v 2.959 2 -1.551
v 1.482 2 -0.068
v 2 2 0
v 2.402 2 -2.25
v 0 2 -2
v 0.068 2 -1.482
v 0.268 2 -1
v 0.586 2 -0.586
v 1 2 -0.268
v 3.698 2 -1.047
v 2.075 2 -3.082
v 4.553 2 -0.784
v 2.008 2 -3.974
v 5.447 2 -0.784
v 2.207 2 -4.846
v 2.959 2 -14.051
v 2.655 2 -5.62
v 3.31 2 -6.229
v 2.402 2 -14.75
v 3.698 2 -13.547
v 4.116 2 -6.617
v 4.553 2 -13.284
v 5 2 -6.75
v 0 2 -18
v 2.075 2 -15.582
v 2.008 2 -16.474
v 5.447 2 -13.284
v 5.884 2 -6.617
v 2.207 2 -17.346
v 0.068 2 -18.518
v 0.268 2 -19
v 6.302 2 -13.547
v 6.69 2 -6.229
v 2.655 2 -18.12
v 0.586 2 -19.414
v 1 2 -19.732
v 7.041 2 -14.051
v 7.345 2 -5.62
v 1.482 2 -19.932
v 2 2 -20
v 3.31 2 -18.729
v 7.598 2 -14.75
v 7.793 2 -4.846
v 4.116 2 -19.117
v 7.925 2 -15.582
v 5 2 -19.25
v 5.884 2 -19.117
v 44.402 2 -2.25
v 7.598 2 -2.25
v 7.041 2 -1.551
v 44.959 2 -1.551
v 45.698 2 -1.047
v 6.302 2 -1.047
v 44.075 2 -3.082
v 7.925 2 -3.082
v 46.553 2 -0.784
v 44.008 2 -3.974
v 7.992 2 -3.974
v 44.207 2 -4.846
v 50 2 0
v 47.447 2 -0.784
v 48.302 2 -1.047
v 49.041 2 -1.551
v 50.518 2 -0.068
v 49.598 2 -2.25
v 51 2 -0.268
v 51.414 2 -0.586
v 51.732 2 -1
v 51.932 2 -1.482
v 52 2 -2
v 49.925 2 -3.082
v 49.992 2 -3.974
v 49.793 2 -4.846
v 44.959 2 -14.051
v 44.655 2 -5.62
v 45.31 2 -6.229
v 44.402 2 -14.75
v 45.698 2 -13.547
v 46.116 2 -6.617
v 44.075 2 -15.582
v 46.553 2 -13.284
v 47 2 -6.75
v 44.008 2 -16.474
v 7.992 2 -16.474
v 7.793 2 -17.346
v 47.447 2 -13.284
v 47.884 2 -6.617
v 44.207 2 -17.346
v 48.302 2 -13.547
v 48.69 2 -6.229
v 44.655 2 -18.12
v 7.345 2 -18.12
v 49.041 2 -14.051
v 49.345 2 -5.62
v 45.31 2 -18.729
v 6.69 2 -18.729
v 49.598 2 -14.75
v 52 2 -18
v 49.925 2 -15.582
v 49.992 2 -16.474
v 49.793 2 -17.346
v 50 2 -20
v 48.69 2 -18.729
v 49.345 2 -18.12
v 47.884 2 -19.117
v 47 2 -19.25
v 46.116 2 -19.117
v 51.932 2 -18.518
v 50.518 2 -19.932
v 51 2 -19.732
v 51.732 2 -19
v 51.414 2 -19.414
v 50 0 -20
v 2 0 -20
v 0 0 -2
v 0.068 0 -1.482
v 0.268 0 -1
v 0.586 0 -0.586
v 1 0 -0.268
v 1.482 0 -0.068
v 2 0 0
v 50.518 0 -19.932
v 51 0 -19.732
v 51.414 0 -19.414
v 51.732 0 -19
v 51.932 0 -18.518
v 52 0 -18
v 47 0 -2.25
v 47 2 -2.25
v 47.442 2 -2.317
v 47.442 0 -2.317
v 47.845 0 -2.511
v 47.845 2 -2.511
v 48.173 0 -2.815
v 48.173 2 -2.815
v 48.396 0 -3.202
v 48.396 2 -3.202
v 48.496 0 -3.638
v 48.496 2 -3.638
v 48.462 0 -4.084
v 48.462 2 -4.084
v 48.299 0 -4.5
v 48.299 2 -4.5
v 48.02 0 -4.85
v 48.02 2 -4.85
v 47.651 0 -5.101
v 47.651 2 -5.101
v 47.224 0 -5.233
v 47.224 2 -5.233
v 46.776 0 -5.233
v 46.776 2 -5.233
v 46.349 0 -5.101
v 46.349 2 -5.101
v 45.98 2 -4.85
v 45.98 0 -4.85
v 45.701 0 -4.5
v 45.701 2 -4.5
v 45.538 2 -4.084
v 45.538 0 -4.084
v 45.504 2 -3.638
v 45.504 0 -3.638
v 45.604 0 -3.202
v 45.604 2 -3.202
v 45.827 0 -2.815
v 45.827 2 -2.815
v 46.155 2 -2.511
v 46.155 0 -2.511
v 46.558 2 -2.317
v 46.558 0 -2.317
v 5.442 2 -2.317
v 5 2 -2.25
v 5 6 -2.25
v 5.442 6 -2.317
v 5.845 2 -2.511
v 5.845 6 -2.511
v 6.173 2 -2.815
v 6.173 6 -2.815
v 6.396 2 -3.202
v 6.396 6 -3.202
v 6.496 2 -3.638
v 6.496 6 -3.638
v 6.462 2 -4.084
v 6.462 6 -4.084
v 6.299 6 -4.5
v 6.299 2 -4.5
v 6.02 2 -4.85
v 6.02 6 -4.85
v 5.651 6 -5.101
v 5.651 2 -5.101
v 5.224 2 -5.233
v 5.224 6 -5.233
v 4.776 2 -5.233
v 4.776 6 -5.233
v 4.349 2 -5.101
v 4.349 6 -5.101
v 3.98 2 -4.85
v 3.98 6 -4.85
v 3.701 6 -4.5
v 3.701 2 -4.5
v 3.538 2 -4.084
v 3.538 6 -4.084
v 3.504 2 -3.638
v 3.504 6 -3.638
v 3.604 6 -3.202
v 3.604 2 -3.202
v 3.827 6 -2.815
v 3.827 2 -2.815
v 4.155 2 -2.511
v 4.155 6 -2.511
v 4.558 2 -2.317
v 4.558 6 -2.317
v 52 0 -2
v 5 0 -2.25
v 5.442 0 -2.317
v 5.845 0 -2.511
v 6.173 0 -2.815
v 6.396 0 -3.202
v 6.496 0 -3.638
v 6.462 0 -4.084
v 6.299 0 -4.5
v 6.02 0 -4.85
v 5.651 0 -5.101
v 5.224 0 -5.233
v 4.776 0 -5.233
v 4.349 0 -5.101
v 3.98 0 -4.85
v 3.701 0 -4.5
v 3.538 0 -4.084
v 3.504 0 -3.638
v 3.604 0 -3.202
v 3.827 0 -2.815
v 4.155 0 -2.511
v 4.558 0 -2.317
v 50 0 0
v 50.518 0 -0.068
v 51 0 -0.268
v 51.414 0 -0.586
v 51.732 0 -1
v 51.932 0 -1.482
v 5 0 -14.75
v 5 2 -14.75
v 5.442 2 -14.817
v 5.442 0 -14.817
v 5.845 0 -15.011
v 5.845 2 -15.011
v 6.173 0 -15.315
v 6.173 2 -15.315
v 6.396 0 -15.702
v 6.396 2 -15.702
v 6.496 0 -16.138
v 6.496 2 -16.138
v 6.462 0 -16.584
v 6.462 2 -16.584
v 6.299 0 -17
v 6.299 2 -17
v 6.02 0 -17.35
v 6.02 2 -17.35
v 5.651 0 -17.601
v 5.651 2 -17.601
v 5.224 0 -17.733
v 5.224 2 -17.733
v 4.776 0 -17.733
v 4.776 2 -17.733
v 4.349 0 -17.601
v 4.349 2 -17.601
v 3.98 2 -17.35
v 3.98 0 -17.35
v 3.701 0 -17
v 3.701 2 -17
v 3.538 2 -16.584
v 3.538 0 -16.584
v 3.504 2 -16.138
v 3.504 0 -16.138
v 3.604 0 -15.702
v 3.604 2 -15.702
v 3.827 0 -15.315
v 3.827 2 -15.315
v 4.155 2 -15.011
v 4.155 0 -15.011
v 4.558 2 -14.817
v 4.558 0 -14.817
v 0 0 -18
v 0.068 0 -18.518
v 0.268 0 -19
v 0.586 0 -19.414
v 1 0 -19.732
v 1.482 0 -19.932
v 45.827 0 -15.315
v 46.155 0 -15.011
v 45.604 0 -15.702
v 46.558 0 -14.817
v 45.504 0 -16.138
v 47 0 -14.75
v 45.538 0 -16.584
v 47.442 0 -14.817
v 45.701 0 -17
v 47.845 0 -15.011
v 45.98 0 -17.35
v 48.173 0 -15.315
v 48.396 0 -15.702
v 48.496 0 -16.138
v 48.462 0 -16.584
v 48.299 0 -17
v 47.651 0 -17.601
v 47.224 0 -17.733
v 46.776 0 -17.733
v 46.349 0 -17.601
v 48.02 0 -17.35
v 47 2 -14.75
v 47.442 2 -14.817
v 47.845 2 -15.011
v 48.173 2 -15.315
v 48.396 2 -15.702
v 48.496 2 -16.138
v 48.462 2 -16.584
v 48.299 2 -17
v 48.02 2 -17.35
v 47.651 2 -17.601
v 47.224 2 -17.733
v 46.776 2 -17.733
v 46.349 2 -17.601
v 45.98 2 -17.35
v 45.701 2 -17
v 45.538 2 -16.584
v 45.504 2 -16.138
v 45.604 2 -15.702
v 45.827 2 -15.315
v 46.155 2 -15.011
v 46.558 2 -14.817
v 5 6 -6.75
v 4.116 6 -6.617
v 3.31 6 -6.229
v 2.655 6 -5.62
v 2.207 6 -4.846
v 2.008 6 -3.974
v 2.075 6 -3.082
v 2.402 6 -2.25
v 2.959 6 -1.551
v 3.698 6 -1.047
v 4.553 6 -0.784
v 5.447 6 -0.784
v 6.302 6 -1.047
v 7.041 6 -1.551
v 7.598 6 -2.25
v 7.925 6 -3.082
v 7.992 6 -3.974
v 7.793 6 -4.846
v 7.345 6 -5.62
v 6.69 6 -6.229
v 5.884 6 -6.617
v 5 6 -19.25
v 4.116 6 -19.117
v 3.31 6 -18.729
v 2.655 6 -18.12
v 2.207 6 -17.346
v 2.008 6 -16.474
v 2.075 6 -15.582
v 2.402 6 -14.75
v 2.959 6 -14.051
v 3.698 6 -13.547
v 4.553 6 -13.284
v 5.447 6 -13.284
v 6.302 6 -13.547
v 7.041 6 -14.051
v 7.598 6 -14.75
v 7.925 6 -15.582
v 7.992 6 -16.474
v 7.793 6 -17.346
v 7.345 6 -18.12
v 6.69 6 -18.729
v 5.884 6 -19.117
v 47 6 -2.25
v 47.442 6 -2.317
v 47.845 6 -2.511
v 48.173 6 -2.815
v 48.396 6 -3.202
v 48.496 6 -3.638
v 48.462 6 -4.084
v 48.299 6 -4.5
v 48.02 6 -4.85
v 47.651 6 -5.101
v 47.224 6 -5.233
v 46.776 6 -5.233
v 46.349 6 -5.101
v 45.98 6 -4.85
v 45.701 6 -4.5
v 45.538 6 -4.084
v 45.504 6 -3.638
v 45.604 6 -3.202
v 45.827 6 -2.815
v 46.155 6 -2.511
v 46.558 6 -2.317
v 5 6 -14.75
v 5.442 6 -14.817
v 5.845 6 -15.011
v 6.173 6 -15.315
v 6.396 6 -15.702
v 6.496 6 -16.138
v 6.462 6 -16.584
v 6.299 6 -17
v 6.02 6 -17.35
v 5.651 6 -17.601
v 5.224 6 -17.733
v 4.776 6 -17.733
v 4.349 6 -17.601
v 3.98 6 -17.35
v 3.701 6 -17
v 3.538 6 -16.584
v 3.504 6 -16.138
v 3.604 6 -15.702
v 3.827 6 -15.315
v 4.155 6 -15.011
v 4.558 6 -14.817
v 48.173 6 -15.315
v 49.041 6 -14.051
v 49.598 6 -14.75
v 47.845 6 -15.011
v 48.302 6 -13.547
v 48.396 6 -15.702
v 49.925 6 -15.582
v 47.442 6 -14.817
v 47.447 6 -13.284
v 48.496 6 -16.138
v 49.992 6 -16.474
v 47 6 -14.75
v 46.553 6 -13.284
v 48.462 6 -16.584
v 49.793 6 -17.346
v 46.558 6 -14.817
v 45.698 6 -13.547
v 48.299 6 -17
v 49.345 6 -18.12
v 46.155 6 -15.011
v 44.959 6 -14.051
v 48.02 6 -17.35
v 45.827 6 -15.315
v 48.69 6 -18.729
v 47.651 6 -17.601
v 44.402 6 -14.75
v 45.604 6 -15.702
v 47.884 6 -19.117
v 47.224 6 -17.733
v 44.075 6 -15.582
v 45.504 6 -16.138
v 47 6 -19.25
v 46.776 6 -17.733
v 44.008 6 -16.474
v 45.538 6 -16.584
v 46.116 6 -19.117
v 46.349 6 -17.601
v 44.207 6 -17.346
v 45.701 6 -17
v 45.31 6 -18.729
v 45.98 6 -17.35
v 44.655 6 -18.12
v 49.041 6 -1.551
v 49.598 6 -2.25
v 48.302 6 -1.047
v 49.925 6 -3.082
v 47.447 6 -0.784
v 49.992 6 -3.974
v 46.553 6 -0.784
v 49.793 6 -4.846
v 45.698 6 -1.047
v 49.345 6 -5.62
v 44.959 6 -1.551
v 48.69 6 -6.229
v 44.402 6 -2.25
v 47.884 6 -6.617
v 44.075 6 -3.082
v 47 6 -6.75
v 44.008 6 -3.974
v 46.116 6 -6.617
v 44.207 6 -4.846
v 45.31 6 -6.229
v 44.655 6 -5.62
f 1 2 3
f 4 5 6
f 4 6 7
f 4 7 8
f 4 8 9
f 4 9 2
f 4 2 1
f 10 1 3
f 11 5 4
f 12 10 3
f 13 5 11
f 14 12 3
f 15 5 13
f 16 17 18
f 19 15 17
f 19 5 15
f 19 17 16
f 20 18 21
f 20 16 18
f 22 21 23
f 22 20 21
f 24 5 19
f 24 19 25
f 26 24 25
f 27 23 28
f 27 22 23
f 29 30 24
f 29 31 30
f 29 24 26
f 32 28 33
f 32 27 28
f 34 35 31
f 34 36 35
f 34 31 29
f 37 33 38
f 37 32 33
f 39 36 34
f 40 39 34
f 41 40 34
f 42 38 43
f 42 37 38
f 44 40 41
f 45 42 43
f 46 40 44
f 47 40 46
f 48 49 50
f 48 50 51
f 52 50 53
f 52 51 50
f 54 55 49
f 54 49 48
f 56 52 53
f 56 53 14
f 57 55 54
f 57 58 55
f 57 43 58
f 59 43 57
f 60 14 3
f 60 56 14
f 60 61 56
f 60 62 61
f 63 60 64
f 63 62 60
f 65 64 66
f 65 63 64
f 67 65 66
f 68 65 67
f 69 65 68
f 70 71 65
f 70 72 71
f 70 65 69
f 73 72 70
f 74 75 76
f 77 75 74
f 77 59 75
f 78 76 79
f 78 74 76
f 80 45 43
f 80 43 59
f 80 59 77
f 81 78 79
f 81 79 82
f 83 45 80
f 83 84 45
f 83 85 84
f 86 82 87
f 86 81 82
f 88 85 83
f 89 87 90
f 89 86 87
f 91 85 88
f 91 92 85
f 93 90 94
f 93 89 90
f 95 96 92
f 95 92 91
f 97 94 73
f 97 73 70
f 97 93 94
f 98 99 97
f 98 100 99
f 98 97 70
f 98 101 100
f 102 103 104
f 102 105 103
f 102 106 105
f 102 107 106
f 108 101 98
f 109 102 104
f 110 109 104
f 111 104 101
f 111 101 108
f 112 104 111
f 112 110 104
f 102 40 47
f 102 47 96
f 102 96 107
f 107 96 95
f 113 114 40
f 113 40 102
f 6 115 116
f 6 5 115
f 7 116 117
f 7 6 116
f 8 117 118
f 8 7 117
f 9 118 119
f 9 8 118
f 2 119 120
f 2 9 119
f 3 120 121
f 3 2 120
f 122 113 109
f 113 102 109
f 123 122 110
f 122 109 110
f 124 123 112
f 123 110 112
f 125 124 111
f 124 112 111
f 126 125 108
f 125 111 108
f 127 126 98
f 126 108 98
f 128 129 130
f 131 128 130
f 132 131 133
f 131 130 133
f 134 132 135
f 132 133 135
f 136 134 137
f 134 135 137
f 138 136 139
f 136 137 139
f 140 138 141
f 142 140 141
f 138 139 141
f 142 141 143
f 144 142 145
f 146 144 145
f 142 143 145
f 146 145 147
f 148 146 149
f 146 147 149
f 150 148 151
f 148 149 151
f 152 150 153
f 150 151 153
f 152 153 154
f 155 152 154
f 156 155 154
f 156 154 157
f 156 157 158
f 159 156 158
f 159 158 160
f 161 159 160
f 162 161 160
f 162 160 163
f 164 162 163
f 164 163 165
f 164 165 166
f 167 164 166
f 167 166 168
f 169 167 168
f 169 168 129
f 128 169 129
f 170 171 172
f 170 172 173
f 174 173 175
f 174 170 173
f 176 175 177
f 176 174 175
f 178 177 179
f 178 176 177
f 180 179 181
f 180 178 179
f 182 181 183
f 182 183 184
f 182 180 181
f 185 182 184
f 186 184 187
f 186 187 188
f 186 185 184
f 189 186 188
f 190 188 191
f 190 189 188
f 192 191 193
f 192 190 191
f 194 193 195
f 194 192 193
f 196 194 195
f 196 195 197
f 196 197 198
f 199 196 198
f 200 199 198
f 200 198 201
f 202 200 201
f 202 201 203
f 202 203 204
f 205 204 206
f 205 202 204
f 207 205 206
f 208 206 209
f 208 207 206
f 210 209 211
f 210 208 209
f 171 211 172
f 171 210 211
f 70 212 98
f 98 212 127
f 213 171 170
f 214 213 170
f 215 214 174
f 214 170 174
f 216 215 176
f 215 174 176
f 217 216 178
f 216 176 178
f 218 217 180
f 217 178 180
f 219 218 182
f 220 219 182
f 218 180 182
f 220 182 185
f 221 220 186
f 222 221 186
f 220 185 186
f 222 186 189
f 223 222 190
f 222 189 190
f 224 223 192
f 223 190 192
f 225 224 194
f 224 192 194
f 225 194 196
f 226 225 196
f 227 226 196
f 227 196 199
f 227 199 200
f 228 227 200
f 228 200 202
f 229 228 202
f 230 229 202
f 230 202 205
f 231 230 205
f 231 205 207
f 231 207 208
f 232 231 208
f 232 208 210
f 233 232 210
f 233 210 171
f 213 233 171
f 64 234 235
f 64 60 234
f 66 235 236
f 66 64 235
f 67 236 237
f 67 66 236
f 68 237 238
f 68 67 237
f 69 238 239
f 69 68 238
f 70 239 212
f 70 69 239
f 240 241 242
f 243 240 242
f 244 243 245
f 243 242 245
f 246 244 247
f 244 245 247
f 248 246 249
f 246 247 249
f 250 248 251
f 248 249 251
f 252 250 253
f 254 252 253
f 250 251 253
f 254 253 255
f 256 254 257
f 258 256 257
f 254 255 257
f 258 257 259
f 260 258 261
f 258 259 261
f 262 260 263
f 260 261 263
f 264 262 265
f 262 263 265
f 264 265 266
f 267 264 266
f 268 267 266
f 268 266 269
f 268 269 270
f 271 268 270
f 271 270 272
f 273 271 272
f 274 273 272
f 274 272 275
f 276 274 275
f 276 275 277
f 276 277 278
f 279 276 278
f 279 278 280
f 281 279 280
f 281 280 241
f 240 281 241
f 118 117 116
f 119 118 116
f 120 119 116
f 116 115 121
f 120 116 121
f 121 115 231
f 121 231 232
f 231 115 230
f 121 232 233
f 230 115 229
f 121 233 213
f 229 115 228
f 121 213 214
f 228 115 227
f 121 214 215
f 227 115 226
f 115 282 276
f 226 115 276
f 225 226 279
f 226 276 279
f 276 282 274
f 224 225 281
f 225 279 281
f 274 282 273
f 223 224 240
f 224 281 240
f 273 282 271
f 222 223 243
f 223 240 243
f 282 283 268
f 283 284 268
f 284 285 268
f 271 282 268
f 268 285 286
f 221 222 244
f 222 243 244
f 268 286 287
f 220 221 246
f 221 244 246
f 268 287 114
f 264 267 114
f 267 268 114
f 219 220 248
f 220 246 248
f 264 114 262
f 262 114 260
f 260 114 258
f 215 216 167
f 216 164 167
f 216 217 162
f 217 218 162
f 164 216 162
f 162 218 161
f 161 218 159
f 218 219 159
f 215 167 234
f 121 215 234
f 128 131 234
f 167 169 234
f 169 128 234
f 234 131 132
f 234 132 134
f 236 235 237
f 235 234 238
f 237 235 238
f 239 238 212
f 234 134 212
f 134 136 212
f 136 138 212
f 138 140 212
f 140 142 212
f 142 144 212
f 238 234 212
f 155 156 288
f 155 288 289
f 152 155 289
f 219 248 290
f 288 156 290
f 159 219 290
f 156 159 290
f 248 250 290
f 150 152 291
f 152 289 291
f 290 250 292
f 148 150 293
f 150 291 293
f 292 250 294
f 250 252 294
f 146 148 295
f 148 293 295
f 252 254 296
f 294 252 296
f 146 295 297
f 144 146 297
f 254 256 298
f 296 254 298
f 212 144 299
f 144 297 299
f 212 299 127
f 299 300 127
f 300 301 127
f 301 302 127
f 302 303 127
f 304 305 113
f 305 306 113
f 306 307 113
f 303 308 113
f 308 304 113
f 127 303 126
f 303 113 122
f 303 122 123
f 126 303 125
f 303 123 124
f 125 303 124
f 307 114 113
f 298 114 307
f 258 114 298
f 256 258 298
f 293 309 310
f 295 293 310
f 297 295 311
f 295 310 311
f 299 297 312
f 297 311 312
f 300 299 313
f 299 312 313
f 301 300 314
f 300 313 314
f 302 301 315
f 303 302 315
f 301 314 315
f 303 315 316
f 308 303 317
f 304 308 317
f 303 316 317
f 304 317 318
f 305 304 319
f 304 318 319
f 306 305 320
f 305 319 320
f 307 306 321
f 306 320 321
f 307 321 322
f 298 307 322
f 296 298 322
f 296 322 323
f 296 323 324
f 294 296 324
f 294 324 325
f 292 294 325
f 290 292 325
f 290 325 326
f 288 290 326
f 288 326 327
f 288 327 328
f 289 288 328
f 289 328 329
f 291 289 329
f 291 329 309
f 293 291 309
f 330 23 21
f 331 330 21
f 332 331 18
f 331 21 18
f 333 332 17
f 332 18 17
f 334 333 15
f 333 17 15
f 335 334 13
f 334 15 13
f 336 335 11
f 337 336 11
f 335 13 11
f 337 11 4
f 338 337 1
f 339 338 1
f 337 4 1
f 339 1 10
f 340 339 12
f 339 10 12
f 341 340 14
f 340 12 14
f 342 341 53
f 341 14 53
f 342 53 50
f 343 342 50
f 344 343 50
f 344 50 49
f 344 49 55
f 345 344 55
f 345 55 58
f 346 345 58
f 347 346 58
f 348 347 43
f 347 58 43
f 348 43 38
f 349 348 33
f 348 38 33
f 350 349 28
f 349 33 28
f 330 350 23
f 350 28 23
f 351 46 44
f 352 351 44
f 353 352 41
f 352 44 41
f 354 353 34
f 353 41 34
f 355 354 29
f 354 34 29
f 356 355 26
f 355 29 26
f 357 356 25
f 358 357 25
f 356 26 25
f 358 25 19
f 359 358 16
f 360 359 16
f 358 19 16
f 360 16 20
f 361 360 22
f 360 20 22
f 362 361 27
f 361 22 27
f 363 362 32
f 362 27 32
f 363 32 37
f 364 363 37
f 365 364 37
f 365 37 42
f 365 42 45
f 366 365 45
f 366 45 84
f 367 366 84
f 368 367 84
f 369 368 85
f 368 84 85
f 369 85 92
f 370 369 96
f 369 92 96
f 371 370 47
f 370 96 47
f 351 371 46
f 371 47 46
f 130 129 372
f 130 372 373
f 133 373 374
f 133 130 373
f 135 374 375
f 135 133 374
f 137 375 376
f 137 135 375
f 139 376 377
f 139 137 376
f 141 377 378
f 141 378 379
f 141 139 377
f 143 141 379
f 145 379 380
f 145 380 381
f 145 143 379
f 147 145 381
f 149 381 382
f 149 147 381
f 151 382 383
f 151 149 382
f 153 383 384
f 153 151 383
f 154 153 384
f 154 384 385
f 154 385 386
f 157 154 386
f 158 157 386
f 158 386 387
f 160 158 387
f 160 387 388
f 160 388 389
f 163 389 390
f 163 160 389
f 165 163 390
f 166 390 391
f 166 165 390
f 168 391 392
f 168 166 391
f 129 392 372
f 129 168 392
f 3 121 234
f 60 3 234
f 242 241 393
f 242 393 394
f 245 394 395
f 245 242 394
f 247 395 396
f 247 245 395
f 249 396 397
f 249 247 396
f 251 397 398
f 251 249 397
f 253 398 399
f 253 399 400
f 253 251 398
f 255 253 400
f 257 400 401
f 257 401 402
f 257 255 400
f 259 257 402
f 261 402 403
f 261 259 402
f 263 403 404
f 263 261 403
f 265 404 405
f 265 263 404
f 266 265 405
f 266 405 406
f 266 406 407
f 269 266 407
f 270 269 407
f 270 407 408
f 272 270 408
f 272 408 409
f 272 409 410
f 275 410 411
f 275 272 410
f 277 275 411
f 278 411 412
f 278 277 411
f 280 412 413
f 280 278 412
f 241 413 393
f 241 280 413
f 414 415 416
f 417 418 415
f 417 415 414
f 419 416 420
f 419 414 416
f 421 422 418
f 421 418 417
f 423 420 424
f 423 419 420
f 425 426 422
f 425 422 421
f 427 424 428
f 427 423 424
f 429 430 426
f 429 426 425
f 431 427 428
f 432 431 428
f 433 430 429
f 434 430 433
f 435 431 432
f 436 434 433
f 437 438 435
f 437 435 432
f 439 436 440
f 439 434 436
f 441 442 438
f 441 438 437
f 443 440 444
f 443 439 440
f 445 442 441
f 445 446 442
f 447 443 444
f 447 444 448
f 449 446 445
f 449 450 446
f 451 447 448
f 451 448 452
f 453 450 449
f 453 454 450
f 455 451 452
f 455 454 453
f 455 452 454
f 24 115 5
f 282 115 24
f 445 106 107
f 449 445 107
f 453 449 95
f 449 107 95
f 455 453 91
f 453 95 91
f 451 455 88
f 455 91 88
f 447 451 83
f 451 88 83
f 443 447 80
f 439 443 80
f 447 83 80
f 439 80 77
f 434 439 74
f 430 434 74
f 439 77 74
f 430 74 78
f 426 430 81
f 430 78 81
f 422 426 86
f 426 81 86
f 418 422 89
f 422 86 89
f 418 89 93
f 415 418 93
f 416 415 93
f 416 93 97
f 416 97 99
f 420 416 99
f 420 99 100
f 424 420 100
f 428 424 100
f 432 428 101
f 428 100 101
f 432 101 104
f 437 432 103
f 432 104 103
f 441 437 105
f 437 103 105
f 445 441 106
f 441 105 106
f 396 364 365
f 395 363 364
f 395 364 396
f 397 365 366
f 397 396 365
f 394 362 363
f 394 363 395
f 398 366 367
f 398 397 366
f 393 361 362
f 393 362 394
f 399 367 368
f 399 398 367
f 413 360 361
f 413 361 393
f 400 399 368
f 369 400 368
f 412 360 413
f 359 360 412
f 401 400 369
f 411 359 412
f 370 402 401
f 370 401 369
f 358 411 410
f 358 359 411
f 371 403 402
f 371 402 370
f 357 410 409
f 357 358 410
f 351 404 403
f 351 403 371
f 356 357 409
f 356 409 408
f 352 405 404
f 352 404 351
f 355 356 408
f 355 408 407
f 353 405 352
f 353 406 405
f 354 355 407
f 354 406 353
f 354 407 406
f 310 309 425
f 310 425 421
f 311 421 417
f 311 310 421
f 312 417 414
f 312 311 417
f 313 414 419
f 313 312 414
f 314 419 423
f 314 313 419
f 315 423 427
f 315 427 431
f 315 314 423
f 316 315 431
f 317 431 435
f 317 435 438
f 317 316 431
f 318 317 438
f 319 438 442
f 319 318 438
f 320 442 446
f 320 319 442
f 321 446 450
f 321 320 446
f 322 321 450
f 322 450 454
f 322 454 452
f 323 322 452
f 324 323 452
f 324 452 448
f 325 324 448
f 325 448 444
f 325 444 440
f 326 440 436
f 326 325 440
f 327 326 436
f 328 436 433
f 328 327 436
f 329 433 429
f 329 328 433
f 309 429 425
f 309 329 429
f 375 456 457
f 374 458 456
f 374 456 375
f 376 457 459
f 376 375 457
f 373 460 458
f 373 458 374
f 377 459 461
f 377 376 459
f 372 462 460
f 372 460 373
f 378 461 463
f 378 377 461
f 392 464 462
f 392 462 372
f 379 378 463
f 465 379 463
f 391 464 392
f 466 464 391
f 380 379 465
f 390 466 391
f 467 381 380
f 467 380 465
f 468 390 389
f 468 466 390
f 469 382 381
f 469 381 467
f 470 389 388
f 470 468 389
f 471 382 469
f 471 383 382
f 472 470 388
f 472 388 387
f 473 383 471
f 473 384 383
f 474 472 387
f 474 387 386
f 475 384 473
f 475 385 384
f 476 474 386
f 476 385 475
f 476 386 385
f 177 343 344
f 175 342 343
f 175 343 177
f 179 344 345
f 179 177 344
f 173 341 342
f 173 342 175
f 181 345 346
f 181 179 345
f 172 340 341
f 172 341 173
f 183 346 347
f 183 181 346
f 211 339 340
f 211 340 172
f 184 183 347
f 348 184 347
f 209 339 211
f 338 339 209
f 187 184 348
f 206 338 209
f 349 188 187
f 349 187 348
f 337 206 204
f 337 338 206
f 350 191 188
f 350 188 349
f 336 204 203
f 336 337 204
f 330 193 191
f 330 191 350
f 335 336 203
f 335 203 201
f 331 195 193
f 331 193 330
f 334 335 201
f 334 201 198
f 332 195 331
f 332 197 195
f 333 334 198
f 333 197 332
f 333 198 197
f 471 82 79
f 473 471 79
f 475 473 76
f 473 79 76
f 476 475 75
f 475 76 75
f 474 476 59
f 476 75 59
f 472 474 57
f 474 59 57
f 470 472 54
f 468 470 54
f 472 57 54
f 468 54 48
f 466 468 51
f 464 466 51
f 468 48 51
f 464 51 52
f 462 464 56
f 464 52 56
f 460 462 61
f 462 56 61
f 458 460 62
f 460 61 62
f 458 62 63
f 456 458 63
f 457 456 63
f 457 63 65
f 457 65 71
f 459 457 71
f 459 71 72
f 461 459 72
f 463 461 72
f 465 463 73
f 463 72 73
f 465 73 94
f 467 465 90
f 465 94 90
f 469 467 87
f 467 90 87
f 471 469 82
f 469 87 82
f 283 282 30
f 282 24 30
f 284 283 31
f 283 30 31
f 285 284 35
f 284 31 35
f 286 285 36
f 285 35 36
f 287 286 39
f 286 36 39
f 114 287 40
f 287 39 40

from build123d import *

# Parameters (mm, degrees)
SKETCH1_W           = 52
SKETCH1_H           = 20
BOSS_EXTRUDE1_DEPTH = 2
SKETCH2_R           = 3
SKETCH2_R_2         = 1.5
BOSS_EXTRUDE2_DEPTH = 4
SKETCH3_R           = 1.5
CUT_EXTRUDE1_DEPTH  = 56.856960175
FILLET1_R           = 2


with BuildPart() as part:
    # Sketch1 → Boss-Extrude1 (new body)
    with BuildSketch(Plane(origin=(0, 0, 0), x_dir=(1, 0, 0), z_dir=(0, 1, 0))):
        with Locations((26, 10)):
            Rectangle(SKETCH1_W, SKETCH1_H)
    extrude(amount=BOSS_EXTRUDE1_DEPTH)

    # Sketch2 → Boss-Extrude2 (add)
    # profile 1 of 4: a face of its own
    with BuildSketch(Plane(origin=(0, 2, 0), x_dir=(1, 0, 0), z_dir=(0, 1, 0))):
        with Locations(Location((5, 16.25, 0), (0, 0, 90))):
            Circle(SKETCH2_R)
        with Locations(Location((5, 16.25, 0), (0, 0, 270))):
            Circle(SKETCH2_R_2, mode=Mode.SUBTRACT)
    # profile 2 of 4: a face of its own
    with BuildSketch(Plane(origin=(0, 2, 0), x_dir=(1, 0, 0), z_dir=(0, 1, 0))):
        with Locations(Location((5, 3.75, 0), (0, 0, 90))):
            Circle(SKETCH2_R)
        with Locations(Location((5, 3.75, 0), (0, 0, 270))):
            Circle(SKETCH2_R_2, mode=Mode.SUBTRACT)
    # profile 3 of 4: a face of its own
    with BuildSketch(Plane(origin=(0, 2, 0), x_dir=(1, 0, 0), z_dir=(0, 1, 0))):
        with Locations(Location((47, 3.75, 0), (0, 0, 90))):
            Circle(SKETCH2_R)
        with Locations(Location((47, 3.75, 0), (0, 0, 270))):
            Circle(SKETCH2_R_2, mode=Mode.SUBTRACT)
    # profile 4 of 4: a face of its own
    with BuildSketch(Plane(origin=(0, 2, 0), x_dir=(1, 0, 0), z_dir=(0, 1, 0))):
        with Locations(Location((47, 16.25, 0), (0, 0, 90))):
            Circle(SKETCH2_R)
        with Locations(Location((47, 16.25, 0), (0, 0, 270))):
            Circle(SKETCH2_R_2, mode=Mode.SUBTRACT)
    extrude(amount=BOSS_EXTRUDE2_DEPTH)

    # Sketch3 → Cut-Extrude1 (cut, through all)
    with BuildSketch(Plane(origin=(0, 2, 0), x_dir=(1, 0, 0), z_dir=(0, 1, 0))):
        with Locations(Location((47, 3.75, 0), (0, 0, 270))):
            Circle(SKETCH3_R)
        with Locations(Location((47, 16.25, 0), (0, 0, 270))):
            Circle(SKETCH3_R)
        with Locations(Location((5, 3.75, 0), (0, 0, 270))):
            Circle(SKETCH3_R)
        with Locations(Location((5, 16.25, 0), (0, 0, 270))):
            Circle(SKETCH3_R)
    extrude(amount=-CUT_EXTRUDE1_DEPTH, mode=Mode.SUBTRACT)

    # Fillet1
    fillet1_edges = [part.edges().sort_by_distance(p)[0] for p in [
        (0, 1, -20),
        (52, 1, -20),
        (52, 1, 0),
        (0, 1, 0),
    ]]
    fillet(fillet1_edges, radius=FILLET1_R)


solid = part.part
